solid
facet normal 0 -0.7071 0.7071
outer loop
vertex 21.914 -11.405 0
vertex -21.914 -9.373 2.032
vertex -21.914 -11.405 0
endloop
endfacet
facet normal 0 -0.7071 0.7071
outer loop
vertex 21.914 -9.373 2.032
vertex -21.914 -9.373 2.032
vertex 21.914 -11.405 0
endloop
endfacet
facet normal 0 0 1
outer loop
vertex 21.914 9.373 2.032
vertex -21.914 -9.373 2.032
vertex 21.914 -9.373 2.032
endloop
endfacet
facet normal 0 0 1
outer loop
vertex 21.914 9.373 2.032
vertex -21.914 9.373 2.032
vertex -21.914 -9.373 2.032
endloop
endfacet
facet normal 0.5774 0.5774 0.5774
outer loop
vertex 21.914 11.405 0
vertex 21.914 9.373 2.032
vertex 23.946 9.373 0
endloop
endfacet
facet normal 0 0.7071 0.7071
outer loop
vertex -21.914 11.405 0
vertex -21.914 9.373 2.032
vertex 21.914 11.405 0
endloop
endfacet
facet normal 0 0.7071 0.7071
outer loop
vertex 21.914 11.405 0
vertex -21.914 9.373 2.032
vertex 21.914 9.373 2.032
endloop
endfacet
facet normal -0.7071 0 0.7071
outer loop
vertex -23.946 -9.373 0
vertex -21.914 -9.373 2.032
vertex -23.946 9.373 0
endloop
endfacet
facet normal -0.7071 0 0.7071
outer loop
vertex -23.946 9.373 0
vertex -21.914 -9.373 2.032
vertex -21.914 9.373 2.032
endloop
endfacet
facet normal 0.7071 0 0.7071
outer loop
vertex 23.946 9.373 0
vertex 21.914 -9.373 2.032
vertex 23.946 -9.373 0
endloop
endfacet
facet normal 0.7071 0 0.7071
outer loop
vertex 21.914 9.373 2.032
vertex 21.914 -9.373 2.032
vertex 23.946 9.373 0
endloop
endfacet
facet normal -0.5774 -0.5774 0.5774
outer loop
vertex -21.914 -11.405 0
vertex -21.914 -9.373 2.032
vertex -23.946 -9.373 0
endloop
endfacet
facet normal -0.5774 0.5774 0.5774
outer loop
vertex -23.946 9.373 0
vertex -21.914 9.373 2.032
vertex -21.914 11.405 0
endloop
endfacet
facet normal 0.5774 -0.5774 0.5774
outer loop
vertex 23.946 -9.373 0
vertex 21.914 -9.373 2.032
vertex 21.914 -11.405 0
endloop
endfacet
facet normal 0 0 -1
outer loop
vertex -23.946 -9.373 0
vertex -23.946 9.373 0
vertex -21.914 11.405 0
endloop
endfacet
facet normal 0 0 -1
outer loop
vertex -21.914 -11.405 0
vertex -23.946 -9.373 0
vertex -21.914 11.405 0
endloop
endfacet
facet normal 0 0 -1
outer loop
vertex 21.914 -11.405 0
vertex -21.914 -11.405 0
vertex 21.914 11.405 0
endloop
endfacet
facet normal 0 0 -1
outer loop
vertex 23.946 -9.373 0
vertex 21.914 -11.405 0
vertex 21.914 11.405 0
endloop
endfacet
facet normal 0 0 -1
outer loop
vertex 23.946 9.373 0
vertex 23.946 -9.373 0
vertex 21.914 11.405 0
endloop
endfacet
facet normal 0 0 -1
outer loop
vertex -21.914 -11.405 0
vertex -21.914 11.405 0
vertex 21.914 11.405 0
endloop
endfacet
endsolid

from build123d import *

# Parameters (mm, degrees)
F0_W     = 47.8917
F0_H     = 22.8092
F1_DEPTH = 2.032
F2_SIZE  = 2.03199


# Not quite as in the source:
# - a fillet or chamfer is up to 0.001 mm smaller than in the source, because OpenCascade refuses the exact size


with BuildPart() as f1:
    # F0 (on Top) → F1 (new body)
    with BuildSketch(Plane.XY):
        Rectangle(F0_W, F0_H)
    extrude(amount=F1_DEPTH)

    # F2 (size 2.032 in the source; OpenCascade refuses exactly that, so slightly less here)
    f2_edges = [f1.edges().sort_by_distance(p)[0] for p in [
        (0, -11.4046, 2.032),
        (-23.94585, 0, 2.032),
        (0, 11.4046, 2.032),
        (23.94585, 0, 2.032),
        (23.94585, -11.4046, 1.016),
        (-23.94585, -11.4046, 1.016),
        (23.94585, 11.4046, 1.016),
        (-23.94585, 11.4046, 1.016),
    ]]
    chamfer(f2_edges, length=F2_SIZE)


solid = f1.part
